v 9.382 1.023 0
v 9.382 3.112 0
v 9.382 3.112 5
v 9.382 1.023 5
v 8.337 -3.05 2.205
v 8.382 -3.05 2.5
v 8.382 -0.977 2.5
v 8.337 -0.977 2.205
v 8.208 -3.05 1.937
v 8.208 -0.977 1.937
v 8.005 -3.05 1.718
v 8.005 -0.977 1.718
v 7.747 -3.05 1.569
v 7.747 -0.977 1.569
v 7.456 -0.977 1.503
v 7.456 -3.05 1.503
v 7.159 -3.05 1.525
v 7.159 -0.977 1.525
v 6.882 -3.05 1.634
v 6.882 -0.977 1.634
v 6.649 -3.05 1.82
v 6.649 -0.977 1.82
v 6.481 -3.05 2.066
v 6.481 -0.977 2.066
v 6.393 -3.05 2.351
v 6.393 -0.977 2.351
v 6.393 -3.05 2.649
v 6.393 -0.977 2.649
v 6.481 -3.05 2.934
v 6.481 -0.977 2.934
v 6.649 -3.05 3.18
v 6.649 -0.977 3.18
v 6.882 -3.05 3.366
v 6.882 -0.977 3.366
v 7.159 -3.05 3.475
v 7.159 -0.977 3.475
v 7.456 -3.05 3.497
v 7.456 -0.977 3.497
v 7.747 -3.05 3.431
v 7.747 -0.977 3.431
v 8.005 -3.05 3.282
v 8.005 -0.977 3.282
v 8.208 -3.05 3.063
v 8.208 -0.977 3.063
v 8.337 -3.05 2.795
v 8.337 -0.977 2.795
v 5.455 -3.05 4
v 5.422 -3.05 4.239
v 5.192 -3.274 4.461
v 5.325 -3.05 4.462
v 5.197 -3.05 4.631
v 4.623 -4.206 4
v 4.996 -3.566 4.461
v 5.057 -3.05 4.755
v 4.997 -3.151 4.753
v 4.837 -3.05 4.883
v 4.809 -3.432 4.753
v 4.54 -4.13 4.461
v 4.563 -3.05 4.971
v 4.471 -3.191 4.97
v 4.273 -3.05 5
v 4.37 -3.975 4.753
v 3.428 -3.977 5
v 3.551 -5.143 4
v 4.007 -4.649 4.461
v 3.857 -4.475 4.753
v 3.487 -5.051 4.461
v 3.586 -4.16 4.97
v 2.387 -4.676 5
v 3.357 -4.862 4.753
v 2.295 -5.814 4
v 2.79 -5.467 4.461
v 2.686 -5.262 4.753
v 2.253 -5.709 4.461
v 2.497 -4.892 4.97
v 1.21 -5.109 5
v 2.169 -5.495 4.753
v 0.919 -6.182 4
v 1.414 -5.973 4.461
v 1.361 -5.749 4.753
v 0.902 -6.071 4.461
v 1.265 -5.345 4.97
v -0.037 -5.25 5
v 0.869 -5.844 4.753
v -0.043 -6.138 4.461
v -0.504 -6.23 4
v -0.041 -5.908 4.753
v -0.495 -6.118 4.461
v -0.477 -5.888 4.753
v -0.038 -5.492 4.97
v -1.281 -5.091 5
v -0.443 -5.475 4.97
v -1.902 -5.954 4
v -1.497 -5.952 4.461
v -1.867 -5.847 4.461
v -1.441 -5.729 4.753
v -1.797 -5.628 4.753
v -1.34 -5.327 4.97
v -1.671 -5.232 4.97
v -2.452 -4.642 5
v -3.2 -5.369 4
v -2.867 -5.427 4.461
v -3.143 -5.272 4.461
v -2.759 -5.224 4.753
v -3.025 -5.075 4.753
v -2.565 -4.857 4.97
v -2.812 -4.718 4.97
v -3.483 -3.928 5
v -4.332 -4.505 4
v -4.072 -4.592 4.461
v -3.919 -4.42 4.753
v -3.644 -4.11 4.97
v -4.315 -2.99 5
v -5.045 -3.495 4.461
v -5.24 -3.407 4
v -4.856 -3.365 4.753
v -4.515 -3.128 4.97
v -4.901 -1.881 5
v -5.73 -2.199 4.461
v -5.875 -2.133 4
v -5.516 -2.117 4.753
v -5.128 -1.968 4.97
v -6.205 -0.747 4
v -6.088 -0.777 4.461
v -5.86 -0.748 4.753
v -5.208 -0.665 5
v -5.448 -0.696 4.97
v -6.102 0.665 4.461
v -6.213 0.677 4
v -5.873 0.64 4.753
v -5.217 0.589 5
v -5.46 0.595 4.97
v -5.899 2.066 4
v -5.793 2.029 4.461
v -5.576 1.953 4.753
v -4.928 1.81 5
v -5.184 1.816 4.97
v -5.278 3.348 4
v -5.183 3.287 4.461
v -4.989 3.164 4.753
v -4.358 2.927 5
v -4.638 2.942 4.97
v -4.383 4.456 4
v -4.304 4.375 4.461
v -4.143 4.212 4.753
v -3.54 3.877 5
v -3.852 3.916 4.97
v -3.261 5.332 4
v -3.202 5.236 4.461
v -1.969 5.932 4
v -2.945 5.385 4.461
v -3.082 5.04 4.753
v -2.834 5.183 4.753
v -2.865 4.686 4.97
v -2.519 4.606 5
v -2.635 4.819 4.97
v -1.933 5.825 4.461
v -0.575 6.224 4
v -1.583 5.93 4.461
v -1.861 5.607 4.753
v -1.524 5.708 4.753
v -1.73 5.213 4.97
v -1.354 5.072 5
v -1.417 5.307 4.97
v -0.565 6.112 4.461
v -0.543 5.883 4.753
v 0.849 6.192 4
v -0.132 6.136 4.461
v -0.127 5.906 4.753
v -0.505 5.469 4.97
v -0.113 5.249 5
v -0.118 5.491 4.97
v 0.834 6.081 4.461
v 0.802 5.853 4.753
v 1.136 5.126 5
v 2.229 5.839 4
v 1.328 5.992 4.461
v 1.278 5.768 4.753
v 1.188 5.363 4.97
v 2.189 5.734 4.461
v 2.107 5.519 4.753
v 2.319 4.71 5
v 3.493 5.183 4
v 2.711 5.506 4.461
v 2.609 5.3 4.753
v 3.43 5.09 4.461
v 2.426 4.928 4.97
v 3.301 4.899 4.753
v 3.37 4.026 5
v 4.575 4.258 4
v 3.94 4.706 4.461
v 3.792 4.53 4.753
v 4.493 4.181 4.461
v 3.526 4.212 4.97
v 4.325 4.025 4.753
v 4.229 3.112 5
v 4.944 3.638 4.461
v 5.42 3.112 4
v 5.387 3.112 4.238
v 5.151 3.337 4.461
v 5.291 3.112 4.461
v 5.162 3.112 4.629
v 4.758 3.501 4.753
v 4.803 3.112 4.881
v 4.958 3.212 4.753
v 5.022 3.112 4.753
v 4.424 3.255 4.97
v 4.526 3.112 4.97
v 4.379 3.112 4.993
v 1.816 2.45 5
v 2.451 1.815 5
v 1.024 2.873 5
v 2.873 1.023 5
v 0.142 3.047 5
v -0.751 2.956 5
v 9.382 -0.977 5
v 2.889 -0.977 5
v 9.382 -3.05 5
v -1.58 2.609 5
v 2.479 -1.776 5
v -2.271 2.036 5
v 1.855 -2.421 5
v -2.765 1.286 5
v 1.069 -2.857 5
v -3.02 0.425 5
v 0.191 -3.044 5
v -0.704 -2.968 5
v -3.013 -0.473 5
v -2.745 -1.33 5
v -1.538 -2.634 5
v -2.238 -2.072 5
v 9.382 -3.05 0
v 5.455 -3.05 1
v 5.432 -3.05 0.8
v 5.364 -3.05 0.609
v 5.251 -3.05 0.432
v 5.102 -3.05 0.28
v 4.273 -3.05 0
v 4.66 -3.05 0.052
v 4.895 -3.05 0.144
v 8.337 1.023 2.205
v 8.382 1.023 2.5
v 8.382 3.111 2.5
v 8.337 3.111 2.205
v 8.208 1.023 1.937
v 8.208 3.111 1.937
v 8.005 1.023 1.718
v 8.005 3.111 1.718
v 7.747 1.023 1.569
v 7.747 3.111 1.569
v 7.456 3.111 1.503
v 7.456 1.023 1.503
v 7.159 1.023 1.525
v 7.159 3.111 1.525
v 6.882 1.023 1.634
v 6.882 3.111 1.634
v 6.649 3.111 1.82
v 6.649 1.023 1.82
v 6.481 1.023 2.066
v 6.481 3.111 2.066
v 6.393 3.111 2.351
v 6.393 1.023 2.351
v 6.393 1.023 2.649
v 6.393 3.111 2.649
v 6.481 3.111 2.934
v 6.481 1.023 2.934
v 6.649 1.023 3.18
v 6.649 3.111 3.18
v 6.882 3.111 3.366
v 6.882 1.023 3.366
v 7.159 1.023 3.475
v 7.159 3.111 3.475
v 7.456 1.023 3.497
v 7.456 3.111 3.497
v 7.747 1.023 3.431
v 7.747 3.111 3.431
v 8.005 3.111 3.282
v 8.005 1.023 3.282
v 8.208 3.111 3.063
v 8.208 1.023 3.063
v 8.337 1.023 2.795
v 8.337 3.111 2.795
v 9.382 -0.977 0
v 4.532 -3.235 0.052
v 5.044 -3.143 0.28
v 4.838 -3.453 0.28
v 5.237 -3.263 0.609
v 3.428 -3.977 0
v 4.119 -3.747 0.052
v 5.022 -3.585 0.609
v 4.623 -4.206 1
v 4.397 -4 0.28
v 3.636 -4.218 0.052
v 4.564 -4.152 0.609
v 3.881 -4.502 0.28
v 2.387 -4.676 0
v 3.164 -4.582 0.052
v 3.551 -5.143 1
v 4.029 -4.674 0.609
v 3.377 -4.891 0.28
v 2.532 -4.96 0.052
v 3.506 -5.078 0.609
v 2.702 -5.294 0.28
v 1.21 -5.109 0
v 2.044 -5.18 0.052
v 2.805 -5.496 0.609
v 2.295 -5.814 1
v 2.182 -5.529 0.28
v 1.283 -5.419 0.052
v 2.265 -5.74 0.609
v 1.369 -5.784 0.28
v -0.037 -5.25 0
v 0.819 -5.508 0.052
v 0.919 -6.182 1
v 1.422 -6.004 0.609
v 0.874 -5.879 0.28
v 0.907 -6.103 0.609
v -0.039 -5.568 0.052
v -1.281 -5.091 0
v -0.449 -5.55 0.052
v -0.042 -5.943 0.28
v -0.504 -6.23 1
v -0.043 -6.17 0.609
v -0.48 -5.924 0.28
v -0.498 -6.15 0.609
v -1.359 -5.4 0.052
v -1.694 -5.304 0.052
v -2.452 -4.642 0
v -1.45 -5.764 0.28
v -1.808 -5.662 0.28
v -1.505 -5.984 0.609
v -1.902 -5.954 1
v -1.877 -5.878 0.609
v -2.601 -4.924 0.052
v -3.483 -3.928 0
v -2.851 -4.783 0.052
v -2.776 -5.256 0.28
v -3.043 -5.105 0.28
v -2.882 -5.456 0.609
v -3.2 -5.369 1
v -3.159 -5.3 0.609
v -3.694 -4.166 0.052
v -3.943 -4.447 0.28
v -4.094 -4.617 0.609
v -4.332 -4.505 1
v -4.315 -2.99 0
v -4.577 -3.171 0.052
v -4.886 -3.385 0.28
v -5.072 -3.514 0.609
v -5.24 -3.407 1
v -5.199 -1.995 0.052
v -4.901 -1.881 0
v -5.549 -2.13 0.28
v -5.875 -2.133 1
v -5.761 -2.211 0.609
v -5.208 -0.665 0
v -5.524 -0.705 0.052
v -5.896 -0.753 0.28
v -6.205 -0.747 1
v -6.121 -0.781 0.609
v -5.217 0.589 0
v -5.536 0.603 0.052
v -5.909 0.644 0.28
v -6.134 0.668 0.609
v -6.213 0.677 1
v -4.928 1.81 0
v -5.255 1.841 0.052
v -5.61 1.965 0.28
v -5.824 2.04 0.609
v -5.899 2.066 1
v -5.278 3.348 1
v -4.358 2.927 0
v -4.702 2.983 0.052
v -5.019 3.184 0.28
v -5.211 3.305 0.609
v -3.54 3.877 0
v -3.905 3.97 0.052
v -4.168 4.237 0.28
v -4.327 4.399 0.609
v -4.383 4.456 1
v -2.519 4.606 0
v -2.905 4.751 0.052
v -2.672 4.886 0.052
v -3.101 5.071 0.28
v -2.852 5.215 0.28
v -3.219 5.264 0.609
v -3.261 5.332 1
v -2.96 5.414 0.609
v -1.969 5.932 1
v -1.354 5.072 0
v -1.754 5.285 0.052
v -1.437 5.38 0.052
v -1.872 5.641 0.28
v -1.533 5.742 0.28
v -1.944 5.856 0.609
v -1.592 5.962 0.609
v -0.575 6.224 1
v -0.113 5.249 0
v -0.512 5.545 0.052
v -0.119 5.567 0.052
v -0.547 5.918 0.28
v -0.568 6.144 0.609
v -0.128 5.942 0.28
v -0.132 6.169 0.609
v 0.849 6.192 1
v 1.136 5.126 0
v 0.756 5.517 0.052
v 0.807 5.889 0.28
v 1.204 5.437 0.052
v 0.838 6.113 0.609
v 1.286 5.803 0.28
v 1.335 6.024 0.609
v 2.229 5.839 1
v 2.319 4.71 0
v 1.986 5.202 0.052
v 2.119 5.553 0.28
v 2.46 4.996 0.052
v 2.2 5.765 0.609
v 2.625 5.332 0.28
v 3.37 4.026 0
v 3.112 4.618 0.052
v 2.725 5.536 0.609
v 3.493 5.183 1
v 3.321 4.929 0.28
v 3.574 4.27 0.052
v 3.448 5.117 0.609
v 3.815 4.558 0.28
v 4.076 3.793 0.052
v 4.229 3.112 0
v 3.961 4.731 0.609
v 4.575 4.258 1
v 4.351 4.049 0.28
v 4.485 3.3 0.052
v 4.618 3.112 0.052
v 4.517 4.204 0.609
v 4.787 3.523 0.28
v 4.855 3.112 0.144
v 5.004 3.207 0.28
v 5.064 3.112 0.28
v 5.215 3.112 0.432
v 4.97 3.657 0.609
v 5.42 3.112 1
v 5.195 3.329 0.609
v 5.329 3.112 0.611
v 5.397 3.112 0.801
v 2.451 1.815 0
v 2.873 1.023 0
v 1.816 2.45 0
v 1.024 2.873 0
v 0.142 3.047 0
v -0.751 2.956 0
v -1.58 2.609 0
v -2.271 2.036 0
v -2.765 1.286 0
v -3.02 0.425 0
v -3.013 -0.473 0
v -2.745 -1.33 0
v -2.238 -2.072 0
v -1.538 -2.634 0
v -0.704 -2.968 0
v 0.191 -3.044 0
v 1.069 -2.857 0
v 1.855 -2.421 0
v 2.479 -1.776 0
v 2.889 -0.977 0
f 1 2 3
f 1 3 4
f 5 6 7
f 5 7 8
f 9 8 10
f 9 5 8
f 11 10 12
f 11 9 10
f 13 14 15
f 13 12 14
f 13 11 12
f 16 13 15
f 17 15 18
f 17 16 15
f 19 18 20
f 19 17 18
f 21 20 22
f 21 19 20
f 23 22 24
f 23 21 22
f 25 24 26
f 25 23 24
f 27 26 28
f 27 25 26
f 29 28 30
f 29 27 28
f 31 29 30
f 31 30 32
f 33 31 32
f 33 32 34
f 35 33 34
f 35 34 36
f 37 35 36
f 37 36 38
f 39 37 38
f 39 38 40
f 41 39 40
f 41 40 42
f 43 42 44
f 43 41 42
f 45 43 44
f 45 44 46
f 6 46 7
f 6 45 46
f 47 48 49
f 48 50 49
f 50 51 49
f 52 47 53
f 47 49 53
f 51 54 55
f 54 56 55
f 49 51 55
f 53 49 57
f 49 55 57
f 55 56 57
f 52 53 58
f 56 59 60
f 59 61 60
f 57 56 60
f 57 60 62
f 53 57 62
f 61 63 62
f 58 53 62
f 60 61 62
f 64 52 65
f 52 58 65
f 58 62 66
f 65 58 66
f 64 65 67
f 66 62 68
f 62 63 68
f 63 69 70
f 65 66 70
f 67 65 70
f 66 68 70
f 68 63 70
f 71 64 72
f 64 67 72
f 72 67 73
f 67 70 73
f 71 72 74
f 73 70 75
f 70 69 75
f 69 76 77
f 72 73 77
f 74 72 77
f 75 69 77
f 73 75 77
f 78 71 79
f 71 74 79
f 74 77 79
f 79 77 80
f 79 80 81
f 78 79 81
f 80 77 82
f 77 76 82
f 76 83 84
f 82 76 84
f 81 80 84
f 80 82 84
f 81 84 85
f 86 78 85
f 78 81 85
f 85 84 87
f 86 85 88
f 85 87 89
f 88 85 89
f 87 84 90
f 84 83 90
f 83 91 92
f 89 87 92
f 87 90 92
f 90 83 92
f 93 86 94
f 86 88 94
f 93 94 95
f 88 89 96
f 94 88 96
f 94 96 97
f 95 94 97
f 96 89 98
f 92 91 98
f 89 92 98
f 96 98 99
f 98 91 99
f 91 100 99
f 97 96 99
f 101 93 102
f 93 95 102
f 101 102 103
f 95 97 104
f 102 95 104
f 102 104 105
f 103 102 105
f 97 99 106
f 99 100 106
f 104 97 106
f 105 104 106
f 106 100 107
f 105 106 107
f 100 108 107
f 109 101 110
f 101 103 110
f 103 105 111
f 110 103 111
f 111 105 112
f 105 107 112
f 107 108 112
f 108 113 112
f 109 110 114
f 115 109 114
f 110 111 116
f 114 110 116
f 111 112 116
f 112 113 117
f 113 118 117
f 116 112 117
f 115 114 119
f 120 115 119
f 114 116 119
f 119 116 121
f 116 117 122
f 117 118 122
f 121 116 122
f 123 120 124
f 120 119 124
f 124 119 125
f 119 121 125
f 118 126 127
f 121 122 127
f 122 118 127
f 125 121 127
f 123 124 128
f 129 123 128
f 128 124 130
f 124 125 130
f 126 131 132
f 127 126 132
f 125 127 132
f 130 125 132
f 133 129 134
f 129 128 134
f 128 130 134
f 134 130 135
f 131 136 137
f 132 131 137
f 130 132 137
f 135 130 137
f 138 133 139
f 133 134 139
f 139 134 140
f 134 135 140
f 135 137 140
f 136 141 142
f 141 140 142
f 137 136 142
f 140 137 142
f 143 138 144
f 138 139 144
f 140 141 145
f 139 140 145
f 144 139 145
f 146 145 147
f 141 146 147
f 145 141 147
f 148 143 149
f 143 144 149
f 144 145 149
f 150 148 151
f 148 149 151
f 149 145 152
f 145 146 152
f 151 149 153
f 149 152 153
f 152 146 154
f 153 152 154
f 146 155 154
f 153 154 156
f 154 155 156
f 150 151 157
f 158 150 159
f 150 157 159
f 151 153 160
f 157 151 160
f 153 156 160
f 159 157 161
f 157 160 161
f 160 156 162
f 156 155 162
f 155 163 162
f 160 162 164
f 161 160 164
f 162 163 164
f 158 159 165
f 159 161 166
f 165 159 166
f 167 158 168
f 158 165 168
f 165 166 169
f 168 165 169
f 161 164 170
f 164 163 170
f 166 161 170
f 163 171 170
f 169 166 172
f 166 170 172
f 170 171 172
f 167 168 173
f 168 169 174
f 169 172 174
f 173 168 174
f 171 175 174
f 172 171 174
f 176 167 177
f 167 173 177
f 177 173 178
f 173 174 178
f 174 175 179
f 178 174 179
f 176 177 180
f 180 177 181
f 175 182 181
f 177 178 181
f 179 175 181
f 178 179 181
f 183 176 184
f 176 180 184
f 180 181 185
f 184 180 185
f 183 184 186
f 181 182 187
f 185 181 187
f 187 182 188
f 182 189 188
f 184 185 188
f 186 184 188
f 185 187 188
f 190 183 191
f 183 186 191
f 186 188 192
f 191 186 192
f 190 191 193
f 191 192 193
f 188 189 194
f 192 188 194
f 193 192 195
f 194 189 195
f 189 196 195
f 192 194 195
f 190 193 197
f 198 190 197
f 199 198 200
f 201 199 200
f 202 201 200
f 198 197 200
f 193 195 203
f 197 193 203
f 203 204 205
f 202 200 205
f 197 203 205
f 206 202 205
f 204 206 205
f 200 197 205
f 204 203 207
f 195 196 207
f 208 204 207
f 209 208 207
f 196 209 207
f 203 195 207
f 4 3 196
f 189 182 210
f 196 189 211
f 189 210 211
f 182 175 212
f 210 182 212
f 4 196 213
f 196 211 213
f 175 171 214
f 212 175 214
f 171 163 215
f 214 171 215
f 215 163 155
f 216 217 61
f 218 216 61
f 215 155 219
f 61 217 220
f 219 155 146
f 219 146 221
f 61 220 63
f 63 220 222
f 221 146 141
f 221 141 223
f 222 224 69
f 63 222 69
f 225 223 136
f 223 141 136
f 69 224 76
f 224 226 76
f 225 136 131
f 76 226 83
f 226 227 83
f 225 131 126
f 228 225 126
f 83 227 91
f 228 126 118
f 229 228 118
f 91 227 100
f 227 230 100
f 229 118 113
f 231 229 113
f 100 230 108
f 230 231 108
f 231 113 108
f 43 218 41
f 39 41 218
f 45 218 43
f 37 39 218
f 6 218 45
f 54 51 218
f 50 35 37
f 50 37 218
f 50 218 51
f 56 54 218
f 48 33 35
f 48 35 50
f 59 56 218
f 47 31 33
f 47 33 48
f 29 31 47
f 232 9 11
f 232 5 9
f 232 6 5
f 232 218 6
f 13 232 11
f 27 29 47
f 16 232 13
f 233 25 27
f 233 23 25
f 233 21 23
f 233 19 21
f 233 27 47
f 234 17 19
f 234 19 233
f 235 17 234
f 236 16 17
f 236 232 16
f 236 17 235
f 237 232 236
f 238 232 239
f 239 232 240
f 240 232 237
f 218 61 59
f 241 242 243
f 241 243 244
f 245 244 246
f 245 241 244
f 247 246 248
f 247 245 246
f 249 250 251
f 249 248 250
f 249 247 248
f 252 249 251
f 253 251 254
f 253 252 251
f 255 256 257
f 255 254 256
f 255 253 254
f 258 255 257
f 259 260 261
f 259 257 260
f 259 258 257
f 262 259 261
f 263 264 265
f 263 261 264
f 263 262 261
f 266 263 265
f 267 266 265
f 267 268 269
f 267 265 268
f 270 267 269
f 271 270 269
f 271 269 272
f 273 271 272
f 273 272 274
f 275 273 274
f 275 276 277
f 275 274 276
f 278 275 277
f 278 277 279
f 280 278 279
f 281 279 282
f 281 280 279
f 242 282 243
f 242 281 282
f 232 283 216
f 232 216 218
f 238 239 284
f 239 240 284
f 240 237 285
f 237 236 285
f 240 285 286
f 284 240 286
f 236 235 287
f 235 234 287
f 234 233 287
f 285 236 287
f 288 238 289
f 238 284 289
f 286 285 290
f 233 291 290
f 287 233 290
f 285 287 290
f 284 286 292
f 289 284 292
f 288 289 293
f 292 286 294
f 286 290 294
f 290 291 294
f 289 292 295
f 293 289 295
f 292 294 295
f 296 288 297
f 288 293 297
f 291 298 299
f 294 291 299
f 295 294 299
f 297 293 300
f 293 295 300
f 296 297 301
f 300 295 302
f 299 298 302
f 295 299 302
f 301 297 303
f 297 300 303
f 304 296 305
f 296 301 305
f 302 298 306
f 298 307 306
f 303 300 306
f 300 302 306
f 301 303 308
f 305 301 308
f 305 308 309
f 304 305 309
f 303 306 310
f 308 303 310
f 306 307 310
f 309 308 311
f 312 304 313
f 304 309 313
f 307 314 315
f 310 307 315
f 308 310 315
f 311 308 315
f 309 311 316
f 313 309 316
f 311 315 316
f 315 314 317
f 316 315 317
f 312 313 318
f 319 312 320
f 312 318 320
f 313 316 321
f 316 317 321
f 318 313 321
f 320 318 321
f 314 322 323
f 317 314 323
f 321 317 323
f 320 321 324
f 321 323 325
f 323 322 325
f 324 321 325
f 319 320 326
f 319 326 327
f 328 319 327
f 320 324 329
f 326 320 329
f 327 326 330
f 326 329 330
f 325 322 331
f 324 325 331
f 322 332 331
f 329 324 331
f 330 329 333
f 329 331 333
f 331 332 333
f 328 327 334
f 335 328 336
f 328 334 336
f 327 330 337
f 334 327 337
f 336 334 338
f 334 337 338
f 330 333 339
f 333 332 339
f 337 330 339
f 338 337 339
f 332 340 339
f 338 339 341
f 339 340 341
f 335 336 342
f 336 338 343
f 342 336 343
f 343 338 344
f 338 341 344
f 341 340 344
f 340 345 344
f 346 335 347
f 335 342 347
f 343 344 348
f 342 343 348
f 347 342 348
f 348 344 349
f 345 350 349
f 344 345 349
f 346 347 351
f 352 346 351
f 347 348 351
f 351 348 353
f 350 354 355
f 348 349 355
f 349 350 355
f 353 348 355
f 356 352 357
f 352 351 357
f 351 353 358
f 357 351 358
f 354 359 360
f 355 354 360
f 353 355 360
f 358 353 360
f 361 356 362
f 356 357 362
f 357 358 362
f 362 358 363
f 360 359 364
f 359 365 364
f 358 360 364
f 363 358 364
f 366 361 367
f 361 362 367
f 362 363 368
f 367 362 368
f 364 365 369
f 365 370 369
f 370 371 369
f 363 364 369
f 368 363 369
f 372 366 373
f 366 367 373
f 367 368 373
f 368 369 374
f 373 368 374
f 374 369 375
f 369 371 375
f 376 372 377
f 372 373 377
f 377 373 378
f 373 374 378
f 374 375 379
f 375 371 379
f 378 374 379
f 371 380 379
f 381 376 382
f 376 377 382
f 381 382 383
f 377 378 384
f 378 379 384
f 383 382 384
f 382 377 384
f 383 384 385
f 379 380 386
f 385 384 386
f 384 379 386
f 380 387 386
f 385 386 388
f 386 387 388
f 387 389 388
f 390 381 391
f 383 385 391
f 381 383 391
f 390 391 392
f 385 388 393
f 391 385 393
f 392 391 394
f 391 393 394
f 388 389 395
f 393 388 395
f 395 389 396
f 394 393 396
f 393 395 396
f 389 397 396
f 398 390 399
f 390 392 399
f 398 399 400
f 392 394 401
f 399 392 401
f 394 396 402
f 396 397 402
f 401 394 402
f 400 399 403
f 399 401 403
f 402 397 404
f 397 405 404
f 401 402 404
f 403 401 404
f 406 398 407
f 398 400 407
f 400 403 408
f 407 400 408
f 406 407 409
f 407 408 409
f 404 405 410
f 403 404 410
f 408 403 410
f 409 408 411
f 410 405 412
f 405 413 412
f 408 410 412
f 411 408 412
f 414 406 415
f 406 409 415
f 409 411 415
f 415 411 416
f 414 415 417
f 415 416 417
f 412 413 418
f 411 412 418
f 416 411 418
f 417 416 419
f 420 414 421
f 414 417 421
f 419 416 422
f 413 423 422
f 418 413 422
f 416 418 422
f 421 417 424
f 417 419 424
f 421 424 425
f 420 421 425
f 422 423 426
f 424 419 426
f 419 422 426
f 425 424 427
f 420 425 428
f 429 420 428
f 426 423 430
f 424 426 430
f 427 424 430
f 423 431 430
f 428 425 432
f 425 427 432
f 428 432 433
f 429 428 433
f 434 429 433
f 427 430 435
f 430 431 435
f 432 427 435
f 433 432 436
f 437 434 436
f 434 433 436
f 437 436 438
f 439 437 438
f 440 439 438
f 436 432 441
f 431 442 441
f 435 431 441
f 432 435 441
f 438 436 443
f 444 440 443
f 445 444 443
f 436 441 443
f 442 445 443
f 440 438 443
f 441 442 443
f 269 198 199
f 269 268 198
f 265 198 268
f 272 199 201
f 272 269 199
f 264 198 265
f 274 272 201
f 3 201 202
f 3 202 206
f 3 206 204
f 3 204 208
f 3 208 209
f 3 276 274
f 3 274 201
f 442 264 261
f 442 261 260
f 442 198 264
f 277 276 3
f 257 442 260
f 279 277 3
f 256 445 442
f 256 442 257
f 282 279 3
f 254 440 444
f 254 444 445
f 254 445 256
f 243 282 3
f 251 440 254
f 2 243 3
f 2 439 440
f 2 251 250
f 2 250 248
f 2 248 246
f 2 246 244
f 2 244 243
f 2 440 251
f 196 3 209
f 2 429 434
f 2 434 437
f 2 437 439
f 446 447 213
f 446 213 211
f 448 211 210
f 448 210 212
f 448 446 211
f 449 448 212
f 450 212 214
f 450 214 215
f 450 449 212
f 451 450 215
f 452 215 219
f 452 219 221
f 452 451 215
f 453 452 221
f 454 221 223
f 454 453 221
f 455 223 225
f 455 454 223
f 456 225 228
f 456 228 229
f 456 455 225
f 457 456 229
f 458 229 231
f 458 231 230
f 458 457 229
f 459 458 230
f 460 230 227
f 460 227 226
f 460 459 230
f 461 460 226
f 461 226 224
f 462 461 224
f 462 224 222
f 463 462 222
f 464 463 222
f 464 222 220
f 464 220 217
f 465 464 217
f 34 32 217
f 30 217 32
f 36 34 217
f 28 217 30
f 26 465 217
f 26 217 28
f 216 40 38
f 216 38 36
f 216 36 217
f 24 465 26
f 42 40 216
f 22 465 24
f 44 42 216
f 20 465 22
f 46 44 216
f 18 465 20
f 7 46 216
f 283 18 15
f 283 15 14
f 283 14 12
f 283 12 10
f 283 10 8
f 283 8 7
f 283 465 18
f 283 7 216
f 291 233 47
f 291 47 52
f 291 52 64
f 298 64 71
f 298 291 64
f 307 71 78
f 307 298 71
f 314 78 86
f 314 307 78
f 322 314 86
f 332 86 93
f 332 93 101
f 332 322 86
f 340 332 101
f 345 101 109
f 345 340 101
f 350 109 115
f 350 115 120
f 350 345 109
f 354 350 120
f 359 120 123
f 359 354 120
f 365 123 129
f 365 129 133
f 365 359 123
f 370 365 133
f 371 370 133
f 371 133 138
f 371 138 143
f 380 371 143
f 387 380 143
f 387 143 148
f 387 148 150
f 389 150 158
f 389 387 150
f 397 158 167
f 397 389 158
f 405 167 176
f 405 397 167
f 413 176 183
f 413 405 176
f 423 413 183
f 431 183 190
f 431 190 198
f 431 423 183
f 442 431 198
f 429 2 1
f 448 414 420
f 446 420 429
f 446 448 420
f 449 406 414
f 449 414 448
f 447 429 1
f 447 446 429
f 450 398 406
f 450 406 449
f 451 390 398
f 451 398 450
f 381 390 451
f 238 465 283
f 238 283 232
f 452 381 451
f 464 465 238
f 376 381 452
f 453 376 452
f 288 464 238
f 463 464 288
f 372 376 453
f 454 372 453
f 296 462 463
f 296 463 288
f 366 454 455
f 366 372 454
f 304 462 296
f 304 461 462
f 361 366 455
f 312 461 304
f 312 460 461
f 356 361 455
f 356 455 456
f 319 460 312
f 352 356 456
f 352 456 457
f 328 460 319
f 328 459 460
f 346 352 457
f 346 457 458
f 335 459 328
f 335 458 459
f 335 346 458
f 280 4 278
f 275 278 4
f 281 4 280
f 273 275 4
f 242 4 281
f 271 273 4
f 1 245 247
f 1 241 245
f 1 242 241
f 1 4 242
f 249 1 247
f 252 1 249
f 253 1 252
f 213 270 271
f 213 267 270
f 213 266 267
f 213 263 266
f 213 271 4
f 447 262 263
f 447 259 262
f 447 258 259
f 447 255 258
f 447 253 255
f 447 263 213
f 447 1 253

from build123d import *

# Parameters (mm, degrees)
BOSS_EXTRUDE1_DEPTH     = 5
FILLET3_R               = 1
FILLET4_R               = 1
CUT_EXTRUDE1_DEPTH      = 13.854889966
CUT_EXTRUDE1_DEPTH_BACK = 13.854889966
SKETCH2_R               = 1


with BuildPart() as part:
    # Sketch1 → Boss-Extrude1 (new body)
    with BuildSketch(Plane(origin=(0, 0, 0), x_dir=(0, 1, 0), z_dir=(0, 0, 1))):
        with BuildLine():
            Line((-0.977144637, -2.88923664), (-0.977144637, -6.118433409))
            Line((-0.977144637, -6.118433409), (-0.977144637, -9.381714775))
            Line((-0.977144637, -9.381714775), (-3.05, -9.381714775))
            Line((-3.05, -9.381714775), (-3.05, -5.455272679))
            ThreePointArc((-3.05, -5.455272679), (-0.035341977, 6.249900075), (3.1115, -5.420430587))
            Line((3.1115, -5.420430587), (3.1115, -9.381714775))
            Line((3.1115, -9.381714775), (1.022855363, -9.381714775))
            Line((1.022855363, -9.381714775), (1.022855363, -6.104337812))
            Line((1.022855363, -6.104337812), (1.022855363, -2.873372044))
            ThreePointArc((1.022855363, -2.873372044), (-0.024192746, 3.049904049), (-0.977144637, -2.88923664))
        make_face()
    extrude(amount=BOSS_EXTRUDE1_DEPTH)

    # Fillet3
    fillet3_edges = [part.edges().sort_by_distance(p)[0] for p in [
        (-6.249900075, -0.035341977, 5),
    ]]
    fillet(fillet3_edges, radius=FILLET3_R)

    # Fillet4
    fillet4_edges = [part.edges().sort_by_distance(p)[0] for p in [
        (-6.249900075, -0.035341977, 0),
    ]]
    fillet(fillet4_edges, radius=FILLET4_R)

    # Sketch2 → Cut-Extrude1 (cut, two sides: drawn at the far end of the back side and taken through both)
    with BuildSketch(Plane(origin=(0, -0.977144637, 0), x_dir=(-1, 0, 0), z_dir=(0, 1, 0)).offset(-CUT_EXTRUDE1_DEPTH_BACK)):
        with Locations(Location((-7.381714775, 2.5, 0), (0, 0, 180))):
            Circle(SKETCH2_R)
    extrude(amount=CUT_EXTRUDE1_DEPTH + CUT_EXTRUDE1_DEPTH_BACK, mode=Mode.SUBTRACT)


solid = part.part
